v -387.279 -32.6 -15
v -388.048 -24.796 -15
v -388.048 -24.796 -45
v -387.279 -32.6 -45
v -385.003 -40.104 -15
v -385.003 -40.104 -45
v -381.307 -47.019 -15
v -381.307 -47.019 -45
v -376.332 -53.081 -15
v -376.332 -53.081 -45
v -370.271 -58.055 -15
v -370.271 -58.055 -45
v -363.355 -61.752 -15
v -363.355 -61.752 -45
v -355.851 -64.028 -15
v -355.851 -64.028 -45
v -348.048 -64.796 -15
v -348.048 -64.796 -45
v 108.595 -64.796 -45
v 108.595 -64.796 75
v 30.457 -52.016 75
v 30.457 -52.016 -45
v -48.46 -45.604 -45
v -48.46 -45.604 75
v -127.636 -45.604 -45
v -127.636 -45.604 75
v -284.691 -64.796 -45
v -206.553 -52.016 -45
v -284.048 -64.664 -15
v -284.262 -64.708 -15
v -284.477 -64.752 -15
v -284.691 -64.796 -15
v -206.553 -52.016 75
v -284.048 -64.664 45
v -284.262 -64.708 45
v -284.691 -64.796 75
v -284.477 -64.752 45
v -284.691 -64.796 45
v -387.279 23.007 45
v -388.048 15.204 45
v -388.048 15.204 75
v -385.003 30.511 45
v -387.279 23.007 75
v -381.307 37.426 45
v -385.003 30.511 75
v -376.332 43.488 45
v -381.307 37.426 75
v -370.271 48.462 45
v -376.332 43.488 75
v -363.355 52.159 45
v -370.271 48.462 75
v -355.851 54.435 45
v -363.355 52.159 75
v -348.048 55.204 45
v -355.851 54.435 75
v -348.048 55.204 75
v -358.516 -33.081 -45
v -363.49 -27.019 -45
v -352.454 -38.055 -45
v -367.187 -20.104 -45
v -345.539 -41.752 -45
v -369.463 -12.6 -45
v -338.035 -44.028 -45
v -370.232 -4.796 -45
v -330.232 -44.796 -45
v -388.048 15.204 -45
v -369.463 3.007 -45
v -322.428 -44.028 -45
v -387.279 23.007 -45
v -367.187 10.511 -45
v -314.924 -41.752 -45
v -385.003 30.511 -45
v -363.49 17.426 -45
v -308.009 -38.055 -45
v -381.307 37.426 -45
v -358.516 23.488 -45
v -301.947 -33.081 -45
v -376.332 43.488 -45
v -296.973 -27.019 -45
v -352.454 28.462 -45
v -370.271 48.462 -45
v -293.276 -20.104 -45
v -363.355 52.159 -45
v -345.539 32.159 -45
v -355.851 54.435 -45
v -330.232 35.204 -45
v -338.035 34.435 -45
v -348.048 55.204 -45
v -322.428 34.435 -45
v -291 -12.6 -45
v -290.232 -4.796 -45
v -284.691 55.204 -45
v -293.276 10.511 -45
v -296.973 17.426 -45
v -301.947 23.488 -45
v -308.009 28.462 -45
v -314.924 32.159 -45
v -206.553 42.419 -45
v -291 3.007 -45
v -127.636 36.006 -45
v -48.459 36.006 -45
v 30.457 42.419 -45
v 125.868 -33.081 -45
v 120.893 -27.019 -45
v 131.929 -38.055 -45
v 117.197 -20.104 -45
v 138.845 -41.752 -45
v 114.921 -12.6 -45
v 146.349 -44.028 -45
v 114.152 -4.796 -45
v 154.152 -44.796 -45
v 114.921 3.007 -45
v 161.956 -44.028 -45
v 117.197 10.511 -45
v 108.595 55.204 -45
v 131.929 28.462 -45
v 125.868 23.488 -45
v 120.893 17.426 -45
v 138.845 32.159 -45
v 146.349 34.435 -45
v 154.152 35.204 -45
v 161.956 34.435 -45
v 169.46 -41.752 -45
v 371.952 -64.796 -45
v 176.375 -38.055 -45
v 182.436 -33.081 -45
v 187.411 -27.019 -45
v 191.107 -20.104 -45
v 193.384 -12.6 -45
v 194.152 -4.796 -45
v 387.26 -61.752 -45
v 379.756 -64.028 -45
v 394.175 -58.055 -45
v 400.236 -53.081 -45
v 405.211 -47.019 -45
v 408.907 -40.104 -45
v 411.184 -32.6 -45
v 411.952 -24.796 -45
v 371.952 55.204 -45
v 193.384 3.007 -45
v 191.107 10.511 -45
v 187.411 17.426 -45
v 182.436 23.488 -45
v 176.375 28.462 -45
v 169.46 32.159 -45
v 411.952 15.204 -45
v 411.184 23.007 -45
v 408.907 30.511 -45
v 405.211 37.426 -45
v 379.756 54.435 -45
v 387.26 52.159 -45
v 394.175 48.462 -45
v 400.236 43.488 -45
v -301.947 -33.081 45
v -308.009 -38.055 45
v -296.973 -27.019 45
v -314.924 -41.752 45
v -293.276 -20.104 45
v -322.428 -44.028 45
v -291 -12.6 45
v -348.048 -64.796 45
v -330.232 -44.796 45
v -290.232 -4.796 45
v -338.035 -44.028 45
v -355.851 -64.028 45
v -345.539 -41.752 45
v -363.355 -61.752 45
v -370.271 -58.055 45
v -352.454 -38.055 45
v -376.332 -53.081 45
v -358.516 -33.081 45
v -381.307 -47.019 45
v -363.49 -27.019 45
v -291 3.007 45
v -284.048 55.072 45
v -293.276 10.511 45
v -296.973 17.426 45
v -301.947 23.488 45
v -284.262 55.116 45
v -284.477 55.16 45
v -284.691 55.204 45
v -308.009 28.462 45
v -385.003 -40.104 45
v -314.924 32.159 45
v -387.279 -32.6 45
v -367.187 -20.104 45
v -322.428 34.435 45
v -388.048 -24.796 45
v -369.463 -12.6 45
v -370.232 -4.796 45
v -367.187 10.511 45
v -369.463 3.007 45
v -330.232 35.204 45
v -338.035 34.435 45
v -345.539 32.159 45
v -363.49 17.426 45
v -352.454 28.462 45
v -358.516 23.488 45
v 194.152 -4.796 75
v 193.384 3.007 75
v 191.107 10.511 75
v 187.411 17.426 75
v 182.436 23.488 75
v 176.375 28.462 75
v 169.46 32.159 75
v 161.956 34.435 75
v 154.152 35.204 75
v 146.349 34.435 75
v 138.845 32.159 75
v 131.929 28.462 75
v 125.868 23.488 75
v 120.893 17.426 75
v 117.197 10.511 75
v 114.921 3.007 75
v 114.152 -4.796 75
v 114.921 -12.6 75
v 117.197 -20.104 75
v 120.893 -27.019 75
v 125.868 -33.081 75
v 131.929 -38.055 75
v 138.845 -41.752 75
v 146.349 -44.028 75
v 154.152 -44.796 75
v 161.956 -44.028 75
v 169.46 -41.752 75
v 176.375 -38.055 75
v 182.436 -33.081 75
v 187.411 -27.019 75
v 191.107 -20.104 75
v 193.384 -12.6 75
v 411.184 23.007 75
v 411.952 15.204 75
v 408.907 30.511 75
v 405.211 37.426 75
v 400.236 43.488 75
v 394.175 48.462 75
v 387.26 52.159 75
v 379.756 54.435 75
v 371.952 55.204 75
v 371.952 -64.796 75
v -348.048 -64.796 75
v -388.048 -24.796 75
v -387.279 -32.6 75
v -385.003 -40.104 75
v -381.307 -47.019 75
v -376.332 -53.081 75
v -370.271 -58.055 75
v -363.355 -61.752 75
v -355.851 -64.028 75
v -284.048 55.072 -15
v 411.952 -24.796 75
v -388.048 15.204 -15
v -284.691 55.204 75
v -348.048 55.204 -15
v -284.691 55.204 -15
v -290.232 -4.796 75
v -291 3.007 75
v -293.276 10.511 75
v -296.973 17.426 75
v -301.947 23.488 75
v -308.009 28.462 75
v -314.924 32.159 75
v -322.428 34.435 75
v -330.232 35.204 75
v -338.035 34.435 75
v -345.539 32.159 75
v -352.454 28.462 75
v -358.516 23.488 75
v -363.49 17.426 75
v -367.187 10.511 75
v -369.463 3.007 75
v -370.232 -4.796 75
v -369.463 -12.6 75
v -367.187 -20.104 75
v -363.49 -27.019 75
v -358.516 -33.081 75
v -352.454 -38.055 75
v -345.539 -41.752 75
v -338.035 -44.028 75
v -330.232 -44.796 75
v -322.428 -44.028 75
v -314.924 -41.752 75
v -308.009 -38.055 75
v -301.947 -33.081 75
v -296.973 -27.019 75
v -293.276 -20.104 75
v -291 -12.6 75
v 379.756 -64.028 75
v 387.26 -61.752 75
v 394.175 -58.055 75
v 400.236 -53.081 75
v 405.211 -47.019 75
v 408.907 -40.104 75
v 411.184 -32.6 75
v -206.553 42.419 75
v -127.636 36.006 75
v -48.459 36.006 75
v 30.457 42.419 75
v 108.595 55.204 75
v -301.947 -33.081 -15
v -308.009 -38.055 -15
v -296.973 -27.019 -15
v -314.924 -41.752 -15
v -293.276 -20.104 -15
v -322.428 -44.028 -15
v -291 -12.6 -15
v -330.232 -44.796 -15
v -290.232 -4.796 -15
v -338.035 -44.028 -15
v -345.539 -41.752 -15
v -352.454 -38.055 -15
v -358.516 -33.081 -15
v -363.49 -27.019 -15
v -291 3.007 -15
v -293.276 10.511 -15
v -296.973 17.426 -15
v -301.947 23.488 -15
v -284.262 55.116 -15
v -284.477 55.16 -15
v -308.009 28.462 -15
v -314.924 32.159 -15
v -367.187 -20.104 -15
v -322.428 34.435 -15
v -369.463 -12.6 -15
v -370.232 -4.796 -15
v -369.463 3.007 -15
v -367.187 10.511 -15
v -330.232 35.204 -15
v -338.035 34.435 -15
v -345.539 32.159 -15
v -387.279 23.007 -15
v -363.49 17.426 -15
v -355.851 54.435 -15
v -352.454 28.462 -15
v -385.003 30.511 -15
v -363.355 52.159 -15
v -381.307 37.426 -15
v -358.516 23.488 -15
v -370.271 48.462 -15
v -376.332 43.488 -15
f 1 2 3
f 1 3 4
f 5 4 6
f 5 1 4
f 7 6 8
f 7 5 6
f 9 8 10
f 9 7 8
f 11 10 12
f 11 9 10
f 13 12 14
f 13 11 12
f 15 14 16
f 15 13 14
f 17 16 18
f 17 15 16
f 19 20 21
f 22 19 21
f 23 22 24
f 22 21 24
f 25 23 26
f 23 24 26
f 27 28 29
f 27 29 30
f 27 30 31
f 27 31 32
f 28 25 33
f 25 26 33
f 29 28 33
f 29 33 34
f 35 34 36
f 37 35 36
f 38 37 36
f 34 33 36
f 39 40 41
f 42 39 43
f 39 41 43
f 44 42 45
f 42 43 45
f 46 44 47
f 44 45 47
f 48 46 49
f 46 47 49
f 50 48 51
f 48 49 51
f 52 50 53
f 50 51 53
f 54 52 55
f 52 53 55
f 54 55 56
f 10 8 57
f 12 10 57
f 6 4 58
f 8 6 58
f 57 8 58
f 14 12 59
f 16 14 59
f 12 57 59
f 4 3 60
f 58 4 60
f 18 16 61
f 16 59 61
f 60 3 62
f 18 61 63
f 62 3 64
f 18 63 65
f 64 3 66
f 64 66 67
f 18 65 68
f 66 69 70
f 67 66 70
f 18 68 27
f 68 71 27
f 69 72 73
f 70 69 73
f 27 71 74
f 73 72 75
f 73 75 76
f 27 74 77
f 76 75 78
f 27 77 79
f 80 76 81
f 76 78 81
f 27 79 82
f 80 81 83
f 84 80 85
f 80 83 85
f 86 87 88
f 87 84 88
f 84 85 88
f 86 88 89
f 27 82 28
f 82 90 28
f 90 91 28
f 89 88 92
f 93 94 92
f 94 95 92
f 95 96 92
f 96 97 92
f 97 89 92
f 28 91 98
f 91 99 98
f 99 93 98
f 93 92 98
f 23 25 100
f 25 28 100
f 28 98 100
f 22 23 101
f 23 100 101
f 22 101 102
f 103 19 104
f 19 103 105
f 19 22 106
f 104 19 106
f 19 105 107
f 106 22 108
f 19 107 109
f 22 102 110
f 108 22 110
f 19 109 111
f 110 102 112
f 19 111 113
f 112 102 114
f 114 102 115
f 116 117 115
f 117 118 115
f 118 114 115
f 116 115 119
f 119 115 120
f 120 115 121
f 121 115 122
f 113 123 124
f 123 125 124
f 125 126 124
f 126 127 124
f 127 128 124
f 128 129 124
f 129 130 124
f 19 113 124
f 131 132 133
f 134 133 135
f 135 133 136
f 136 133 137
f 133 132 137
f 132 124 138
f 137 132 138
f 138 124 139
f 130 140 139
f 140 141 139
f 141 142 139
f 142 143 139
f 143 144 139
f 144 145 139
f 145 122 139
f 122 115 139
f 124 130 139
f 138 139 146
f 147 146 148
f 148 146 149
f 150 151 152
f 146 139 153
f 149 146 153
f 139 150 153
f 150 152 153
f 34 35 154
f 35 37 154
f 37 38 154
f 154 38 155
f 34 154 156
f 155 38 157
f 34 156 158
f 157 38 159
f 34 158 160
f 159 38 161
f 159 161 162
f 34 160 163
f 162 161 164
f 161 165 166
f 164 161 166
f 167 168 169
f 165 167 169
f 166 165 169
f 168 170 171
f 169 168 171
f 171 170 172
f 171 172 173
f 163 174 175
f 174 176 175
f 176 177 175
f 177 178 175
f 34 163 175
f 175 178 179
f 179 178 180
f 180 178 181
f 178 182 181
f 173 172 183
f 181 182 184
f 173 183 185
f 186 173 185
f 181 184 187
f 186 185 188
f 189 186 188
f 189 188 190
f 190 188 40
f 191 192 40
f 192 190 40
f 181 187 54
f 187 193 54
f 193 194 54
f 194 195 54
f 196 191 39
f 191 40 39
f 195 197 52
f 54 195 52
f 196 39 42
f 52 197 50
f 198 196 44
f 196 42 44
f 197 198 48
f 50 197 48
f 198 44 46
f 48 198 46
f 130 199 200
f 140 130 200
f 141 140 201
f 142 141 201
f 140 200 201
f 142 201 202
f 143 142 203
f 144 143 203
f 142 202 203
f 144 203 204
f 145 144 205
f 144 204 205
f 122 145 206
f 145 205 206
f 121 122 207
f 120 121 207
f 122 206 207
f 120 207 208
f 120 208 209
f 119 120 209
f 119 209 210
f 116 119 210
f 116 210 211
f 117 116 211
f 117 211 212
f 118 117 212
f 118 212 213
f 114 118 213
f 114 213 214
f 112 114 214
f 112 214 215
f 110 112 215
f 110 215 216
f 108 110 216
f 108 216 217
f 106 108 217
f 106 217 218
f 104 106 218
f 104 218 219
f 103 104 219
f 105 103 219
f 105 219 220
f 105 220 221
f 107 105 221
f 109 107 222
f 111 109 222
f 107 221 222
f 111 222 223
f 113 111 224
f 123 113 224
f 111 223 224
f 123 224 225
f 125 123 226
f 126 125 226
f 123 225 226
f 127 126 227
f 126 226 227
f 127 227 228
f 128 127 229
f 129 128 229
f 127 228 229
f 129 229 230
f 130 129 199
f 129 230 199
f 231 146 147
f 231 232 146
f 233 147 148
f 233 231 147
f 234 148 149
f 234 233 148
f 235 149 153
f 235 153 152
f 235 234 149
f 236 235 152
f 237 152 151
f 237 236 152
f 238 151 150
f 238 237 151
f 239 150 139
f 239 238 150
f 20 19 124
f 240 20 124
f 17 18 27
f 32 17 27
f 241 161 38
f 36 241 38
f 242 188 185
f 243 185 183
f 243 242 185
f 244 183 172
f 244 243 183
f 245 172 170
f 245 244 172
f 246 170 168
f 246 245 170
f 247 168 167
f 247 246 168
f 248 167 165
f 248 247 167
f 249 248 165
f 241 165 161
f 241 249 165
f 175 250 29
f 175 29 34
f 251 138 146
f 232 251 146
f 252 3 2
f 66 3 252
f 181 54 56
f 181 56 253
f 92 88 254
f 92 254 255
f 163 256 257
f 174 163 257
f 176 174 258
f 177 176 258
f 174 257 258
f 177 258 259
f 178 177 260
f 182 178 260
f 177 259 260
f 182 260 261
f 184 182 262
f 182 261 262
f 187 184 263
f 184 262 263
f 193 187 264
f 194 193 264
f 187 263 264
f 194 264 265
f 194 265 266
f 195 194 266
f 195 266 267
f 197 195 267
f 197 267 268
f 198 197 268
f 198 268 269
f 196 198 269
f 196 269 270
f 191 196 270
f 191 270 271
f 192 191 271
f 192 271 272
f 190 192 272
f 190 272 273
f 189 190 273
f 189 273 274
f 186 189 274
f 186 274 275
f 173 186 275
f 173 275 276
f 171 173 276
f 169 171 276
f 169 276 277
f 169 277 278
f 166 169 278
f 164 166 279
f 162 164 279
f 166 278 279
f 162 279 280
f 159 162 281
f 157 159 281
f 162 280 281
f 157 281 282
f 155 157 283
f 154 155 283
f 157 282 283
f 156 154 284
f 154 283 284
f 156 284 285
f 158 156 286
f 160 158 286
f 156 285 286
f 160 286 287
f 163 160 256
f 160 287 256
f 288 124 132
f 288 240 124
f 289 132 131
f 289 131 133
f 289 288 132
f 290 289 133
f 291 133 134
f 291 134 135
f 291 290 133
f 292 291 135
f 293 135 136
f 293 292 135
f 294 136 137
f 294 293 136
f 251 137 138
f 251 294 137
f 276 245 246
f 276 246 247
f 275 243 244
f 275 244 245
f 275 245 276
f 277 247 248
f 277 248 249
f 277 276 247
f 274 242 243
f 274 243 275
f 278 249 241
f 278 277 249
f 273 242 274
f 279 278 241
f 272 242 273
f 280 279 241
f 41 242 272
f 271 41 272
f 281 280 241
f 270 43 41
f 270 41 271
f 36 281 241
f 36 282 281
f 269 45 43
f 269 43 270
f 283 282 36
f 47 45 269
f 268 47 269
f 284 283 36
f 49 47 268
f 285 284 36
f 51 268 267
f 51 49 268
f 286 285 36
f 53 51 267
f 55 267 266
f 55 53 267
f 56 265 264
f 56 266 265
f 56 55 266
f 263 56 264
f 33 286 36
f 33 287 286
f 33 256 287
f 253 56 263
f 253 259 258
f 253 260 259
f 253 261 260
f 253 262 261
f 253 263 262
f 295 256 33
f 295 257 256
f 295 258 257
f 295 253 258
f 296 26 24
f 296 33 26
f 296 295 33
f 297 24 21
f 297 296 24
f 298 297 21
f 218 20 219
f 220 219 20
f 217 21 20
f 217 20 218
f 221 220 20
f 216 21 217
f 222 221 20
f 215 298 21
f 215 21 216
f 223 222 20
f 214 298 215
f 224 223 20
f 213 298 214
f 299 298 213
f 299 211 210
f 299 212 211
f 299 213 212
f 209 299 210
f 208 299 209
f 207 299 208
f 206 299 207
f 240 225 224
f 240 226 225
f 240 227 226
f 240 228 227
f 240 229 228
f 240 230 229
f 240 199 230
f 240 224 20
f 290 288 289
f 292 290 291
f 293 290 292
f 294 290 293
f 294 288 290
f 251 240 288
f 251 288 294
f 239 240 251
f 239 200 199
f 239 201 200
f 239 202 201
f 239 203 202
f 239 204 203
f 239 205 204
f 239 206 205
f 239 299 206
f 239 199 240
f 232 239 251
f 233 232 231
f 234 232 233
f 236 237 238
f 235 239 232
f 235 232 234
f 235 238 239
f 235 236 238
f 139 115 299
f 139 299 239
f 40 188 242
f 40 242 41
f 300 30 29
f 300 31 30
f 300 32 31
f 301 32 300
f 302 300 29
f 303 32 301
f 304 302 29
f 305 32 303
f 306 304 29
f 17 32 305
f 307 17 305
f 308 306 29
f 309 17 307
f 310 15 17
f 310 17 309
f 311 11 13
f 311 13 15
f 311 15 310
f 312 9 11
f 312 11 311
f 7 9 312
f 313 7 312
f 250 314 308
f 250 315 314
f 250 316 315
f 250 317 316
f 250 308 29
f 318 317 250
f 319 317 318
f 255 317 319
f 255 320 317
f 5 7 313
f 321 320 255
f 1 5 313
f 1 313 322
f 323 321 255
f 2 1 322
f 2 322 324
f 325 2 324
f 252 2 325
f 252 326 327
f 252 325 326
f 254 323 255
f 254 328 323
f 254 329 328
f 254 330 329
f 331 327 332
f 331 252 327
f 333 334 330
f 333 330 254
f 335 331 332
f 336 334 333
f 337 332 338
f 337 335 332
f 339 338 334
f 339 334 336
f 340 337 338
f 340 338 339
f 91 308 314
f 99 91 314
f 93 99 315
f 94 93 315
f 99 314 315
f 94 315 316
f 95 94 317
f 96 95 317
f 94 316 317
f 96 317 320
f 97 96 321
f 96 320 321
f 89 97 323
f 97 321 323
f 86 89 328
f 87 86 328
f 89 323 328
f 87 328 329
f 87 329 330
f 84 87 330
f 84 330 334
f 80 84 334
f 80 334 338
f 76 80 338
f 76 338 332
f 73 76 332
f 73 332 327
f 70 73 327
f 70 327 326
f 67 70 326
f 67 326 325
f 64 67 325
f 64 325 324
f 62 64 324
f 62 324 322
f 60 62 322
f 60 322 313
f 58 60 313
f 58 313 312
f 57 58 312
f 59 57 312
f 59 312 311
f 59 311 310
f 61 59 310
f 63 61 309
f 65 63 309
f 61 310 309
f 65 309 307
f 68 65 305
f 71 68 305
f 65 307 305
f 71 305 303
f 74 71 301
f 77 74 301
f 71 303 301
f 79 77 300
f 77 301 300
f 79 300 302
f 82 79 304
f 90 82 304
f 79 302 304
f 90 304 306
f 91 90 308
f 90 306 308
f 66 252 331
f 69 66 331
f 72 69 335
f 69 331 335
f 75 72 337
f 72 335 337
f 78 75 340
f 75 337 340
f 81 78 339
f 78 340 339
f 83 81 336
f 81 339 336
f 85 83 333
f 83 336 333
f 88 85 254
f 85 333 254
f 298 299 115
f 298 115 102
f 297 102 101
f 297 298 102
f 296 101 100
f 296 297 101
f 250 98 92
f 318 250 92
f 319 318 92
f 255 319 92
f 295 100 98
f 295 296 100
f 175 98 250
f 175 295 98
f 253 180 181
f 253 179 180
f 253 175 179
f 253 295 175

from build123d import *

# Parameters (mm, degrees)
SKETCH1_W           = 200
SKETCH1_H           = 30
BOSS_EXTRUDE1_DEPTH = 30
FILLET1_R           = 10
CUT_EXTRUDE1_DEPTH  = 30
SKETCH4_W           = 15
SKETCH4_H           = 30
CUT_EXTRUDE3_DEPTH  = 26
SKETCH5_R           = 10
CUT_EXTRUDE4_DEPTH  = 45
SCALE1_SCALE        = 4


with BuildPart() as part:
    # Sketch1 → Boss-Extrude1 (new body)
    with BuildSketch(Plane.XY):
        with Locations((46.259717806, -4.797058824)):
            Rectangle(SKETCH1_W, SKETCH1_H)
    extrude(amount=BOSS_EXTRUDE1_DEPTH)

    # Fillet1
    fillet1_edges = [part.edges().sort_by_distance(p)[0] for p in [
        (-53.740282194, 10.202941176, 15),
        (146.259717806, 10.202941176, 15),
        (146.259717806, -19.797058824, 15),
        (-53.740282194, -19.797058824, 15),
    ]]
    fillet(fillet1_edges, radius=FILLET1_R)

    # Sketch2 → Cut-Extrude1 (cut)
    with BuildSketch(Plane.XY.offset(30)):
        with BuildLine():
            Line((-27.901084514, 10.202941176), (70.420520136, 10.202941176))
            ThreePointArc((70.420520136, 10.202941176), (21.259717811, 5.202941178), (-27.901084514, 10.202941176))
        make_face()
        with BuildLine():
            Line((-27.901084524, -19.797058824), (70.420520136, -19.797058824))
            ThreePointArc((70.420520136, -19.797058824), (21.259717806, -14.798405243), (-27.901084524, -19.797058824))
        make_face()
    extrude(amount=-CUT_EXTRUDE1_DEPTH, mode=Mode.SUBTRACT)

    # Sketch4 → Cut-Extrude3 (cut)
    with BuildSketch(Plane.ZY.offset(53.740282194)):
        with Locations((15, -4.797058824)):
            Rectangle(SKETCH4_W, SKETCH4_H)
    extrude(amount=-CUT_EXTRUDE3_DEPTH, mode=Mode.SUBTRACT)

    # Sketch5 → Cut-Extrude4 (cut)
    with BuildSketch(Plane.XY.offset(30)):
        with Locations((-39.286224807, -4.797058824)):
            Circle(SKETCH5_R)
        with Locations((81.809717806, -4.797058824)):
            Circle(SKETCH5_R)
    extrude(amount=-CUT_EXTRUDE4_DEPTH, mode=Mode.SUBTRACT)


with BuildPart() as part_1:
    # Scale1: scaled about (57.695562261, -4.797279973, 15)
    add(part.part.scale(SCALE1_SCALE).moved(Location((-173.086686783, 14.391839919, -45))))


solid = part_1.part
